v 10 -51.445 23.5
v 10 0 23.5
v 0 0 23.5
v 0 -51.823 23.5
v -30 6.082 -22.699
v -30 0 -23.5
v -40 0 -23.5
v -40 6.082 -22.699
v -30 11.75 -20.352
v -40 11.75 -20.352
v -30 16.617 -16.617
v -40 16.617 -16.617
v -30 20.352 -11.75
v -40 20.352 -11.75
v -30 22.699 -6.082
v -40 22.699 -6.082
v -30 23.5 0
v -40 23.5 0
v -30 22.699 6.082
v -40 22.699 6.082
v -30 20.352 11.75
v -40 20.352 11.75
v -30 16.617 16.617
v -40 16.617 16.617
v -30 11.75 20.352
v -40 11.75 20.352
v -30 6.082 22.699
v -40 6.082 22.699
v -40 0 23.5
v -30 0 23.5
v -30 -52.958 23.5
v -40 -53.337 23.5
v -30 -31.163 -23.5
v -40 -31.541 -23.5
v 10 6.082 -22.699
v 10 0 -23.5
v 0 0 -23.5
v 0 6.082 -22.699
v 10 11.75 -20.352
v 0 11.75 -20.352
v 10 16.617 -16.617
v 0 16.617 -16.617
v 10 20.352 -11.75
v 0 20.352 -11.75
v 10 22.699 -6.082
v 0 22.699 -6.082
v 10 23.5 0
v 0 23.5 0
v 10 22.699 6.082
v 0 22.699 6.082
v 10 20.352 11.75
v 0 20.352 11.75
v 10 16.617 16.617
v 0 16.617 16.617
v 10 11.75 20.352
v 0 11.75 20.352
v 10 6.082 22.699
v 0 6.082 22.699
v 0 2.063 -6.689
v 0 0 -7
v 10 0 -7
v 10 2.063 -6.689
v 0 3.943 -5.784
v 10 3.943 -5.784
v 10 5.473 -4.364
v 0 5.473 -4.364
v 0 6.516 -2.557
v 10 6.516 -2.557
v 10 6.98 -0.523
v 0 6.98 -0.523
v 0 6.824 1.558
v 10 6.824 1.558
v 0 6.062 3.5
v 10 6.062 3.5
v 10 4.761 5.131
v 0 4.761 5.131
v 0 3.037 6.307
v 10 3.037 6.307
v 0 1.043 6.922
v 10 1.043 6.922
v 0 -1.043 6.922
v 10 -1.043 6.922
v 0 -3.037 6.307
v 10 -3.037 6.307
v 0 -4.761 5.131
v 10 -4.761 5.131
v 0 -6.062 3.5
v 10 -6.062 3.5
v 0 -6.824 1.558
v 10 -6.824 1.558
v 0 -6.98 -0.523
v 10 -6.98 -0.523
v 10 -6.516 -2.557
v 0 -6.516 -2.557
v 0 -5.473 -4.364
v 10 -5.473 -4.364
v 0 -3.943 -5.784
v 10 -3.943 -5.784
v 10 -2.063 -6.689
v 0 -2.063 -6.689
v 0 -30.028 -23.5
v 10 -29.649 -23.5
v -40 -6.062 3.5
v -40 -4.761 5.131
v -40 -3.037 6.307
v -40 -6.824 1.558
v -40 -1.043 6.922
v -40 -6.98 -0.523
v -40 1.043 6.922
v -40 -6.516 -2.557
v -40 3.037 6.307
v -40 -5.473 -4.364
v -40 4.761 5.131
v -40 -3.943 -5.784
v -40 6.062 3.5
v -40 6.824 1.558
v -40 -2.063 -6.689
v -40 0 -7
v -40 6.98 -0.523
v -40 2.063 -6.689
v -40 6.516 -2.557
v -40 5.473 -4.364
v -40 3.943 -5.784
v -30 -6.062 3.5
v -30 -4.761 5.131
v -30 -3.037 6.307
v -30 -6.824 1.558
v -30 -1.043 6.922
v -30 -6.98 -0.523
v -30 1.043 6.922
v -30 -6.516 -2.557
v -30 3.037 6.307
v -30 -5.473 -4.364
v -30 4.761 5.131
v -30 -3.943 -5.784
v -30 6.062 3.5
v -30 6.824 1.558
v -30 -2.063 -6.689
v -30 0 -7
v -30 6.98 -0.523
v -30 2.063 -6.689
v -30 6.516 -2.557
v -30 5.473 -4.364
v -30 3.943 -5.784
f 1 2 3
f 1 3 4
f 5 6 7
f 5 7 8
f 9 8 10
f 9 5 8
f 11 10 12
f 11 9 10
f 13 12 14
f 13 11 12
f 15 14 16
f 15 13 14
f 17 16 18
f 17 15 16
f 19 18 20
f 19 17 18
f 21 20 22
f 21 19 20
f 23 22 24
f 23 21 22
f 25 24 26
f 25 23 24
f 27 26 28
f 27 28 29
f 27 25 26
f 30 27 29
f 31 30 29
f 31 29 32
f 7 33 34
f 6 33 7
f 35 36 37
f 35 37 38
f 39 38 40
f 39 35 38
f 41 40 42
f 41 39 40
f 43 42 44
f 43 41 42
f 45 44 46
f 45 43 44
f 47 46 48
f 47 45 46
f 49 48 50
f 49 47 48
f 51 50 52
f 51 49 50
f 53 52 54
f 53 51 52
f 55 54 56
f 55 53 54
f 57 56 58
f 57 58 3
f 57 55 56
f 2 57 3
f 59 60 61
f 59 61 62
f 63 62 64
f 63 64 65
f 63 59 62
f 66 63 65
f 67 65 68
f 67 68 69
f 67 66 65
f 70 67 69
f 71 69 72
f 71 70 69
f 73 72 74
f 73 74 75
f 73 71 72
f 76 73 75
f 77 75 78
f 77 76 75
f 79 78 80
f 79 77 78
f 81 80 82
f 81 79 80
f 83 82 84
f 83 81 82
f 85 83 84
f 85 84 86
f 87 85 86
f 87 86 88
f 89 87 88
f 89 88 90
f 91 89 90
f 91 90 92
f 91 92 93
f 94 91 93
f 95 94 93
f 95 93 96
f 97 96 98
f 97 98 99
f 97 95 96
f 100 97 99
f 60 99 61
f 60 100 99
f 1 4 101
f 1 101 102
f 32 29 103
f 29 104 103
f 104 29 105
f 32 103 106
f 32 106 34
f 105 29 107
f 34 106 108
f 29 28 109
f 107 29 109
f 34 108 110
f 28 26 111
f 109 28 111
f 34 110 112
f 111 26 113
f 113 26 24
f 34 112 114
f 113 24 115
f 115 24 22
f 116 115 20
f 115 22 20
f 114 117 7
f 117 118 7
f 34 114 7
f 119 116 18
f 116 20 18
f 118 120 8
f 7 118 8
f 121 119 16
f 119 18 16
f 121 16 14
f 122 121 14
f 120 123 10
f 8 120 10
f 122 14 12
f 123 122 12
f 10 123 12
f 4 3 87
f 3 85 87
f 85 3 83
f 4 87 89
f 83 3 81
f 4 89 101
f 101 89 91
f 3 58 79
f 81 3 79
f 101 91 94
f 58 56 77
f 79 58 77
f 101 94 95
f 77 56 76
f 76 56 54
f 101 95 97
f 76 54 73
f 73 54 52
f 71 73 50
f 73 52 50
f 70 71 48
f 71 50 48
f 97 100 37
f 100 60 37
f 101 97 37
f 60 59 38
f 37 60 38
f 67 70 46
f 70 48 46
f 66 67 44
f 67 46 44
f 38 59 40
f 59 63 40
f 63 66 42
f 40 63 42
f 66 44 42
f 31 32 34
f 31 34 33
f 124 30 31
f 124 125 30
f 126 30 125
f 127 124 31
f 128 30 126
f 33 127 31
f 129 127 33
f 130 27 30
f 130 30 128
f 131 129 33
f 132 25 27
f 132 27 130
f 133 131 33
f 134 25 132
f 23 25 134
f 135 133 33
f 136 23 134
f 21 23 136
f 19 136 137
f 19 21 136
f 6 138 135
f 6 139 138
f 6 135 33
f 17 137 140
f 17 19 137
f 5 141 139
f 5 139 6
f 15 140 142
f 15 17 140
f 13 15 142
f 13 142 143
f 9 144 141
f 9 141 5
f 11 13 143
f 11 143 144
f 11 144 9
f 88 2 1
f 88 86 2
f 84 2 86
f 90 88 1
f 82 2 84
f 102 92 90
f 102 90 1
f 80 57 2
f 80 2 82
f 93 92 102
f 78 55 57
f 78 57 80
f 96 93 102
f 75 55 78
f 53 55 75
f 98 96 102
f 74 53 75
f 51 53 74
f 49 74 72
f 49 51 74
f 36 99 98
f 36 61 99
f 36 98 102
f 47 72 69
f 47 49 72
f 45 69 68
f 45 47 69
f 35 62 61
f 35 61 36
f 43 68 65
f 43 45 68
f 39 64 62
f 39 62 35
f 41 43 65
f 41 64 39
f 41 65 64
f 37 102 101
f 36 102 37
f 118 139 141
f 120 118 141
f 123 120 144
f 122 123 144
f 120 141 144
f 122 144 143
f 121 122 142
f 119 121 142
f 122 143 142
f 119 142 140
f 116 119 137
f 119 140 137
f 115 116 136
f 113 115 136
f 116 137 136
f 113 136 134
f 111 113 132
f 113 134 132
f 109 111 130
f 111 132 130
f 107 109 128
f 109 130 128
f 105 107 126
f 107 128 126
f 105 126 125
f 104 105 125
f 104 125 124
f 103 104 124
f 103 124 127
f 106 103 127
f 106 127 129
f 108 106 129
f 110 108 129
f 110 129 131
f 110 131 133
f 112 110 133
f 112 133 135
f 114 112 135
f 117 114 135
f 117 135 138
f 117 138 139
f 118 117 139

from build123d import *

# Parameters (mm, degrees)
EXTRUDE_1_DEPTH      = 10
EXTRUDE_1_DEPTH_BACK = 40
SKETCH_1_R           = 7
CUT_EXTRUDE_START    = -30
SKETCH_1_2_R         = 7
CUT_EXTRUDE_1_DEPTH  = 30
SKETCH_2_R           = 285.396943436
CUT_EXTRUDE_2_DEPTH  = 284.687476453


with BuildPart() as part:
    # 草图1 → 凸台-拉伸1 (new, two sides: drawn at the far end of the back side and taken through both)
    with BuildSketch(Plane(origin=(0, 0, 0), x_dir=(0, 0, -1), z_dir=(1, 0, 0)).offset(-EXTRUDE_1_DEPTH_BACK)):
        with BuildLine():
            Line((-23.5, 0), (-23.5, -107.176978603))
            Line((-23.5, -107.176978603), (23.5, -107.176978603))
            Line((23.5, -107.176978603), (23.5, 0))
            ThreePointArc((23.5, 0), (0, 23.5), (-23.5, 0))
        make_face()
        Circle(SKETCH_1_R, mode=Mode.SUBTRACT)
    extrude(amount=EXTRUDE_1_DEPTH + EXTRUDE_1_DEPTH_BACK)

    # 草图1<2> → 切除-拉伸1 (cut)
    with BuildSketch(Plane(origin=(0, 0, 0), x_dir=(0, 0, -1), z_dir=(1, 0, 0)).offset(CUT_EXTRUDE_START)):
        with BuildLine():
            Line((-23.5, 0), (-23.5, -107.176978603))
            Line((-23.5, -107.176978603), (23.5, -107.176978603))
            Line((23.5, -107.176978603), (23.5, 0))
            ThreePointArc((23.5, 0), (0, 23.5), (-23.5, 0))
        make_face()
        Circle(SKETCH_1_2_R, mode=Mode.SUBTRACT)
    extrude(amount=CUT_EXTRUDE_1_DEPTH, mode=Mode.SUBTRACT)


with BuildPart() as cut_extrude_1_piece_1:
    # of the separate pieces the step leaves, piece 1, a body of its own (cut_extrude_1_pieces)
    add(part.part.solids().sort_by_distance((10, 0, 23.5))[0])


with BuildPart() as cut_extrude_1_piece_2:
    # of the separate pieces the step leaves, piece 2, a body of its own (cut_extrude_1_pieces)
    add(part.part.solids().sort_by_distance((-30, 0, 23.5))[0])


with BuildPart() as cut_extrude_2_tool:
    # 草图2 → 切除-拉伸2 (new body)
    with BuildSketch(Plane(origin=(1.273035004, -33.642623321, -15.600983239), x_dir=(0.9994112974805099, 0.031124564928844464, 0.014433292289486975), z_dir=(-0.03430828570948451, 0.9066684964225279, 0.4204464045827826))):
        Circle(SKETCH_2_R)
    extrude(amount=-CUT_EXTRUDE_2_DEPTH)


with BuildPart() as cut_extrude_1_piece_1_1:
    add(cut_extrude_1_piece_1.part)

    # 切除-拉伸2: cut by cut_extrude_2_tool
    add(cut_extrude_2_tool.part, mode=Mode.SUBTRACT)


with BuildPart() as cut_extrude_1_piece_2_1:
    add(cut_extrude_1_piece_2.part)

    # 切除-拉伸2: cut by cut_extrude_2_tool
    add(cut_extrude_2_tool.part, mode=Mode.SUBTRACT)


solid = Compound([cut_extrude_1_piece_1_1.part, cut_extrude_1_piece_2_1.part])
